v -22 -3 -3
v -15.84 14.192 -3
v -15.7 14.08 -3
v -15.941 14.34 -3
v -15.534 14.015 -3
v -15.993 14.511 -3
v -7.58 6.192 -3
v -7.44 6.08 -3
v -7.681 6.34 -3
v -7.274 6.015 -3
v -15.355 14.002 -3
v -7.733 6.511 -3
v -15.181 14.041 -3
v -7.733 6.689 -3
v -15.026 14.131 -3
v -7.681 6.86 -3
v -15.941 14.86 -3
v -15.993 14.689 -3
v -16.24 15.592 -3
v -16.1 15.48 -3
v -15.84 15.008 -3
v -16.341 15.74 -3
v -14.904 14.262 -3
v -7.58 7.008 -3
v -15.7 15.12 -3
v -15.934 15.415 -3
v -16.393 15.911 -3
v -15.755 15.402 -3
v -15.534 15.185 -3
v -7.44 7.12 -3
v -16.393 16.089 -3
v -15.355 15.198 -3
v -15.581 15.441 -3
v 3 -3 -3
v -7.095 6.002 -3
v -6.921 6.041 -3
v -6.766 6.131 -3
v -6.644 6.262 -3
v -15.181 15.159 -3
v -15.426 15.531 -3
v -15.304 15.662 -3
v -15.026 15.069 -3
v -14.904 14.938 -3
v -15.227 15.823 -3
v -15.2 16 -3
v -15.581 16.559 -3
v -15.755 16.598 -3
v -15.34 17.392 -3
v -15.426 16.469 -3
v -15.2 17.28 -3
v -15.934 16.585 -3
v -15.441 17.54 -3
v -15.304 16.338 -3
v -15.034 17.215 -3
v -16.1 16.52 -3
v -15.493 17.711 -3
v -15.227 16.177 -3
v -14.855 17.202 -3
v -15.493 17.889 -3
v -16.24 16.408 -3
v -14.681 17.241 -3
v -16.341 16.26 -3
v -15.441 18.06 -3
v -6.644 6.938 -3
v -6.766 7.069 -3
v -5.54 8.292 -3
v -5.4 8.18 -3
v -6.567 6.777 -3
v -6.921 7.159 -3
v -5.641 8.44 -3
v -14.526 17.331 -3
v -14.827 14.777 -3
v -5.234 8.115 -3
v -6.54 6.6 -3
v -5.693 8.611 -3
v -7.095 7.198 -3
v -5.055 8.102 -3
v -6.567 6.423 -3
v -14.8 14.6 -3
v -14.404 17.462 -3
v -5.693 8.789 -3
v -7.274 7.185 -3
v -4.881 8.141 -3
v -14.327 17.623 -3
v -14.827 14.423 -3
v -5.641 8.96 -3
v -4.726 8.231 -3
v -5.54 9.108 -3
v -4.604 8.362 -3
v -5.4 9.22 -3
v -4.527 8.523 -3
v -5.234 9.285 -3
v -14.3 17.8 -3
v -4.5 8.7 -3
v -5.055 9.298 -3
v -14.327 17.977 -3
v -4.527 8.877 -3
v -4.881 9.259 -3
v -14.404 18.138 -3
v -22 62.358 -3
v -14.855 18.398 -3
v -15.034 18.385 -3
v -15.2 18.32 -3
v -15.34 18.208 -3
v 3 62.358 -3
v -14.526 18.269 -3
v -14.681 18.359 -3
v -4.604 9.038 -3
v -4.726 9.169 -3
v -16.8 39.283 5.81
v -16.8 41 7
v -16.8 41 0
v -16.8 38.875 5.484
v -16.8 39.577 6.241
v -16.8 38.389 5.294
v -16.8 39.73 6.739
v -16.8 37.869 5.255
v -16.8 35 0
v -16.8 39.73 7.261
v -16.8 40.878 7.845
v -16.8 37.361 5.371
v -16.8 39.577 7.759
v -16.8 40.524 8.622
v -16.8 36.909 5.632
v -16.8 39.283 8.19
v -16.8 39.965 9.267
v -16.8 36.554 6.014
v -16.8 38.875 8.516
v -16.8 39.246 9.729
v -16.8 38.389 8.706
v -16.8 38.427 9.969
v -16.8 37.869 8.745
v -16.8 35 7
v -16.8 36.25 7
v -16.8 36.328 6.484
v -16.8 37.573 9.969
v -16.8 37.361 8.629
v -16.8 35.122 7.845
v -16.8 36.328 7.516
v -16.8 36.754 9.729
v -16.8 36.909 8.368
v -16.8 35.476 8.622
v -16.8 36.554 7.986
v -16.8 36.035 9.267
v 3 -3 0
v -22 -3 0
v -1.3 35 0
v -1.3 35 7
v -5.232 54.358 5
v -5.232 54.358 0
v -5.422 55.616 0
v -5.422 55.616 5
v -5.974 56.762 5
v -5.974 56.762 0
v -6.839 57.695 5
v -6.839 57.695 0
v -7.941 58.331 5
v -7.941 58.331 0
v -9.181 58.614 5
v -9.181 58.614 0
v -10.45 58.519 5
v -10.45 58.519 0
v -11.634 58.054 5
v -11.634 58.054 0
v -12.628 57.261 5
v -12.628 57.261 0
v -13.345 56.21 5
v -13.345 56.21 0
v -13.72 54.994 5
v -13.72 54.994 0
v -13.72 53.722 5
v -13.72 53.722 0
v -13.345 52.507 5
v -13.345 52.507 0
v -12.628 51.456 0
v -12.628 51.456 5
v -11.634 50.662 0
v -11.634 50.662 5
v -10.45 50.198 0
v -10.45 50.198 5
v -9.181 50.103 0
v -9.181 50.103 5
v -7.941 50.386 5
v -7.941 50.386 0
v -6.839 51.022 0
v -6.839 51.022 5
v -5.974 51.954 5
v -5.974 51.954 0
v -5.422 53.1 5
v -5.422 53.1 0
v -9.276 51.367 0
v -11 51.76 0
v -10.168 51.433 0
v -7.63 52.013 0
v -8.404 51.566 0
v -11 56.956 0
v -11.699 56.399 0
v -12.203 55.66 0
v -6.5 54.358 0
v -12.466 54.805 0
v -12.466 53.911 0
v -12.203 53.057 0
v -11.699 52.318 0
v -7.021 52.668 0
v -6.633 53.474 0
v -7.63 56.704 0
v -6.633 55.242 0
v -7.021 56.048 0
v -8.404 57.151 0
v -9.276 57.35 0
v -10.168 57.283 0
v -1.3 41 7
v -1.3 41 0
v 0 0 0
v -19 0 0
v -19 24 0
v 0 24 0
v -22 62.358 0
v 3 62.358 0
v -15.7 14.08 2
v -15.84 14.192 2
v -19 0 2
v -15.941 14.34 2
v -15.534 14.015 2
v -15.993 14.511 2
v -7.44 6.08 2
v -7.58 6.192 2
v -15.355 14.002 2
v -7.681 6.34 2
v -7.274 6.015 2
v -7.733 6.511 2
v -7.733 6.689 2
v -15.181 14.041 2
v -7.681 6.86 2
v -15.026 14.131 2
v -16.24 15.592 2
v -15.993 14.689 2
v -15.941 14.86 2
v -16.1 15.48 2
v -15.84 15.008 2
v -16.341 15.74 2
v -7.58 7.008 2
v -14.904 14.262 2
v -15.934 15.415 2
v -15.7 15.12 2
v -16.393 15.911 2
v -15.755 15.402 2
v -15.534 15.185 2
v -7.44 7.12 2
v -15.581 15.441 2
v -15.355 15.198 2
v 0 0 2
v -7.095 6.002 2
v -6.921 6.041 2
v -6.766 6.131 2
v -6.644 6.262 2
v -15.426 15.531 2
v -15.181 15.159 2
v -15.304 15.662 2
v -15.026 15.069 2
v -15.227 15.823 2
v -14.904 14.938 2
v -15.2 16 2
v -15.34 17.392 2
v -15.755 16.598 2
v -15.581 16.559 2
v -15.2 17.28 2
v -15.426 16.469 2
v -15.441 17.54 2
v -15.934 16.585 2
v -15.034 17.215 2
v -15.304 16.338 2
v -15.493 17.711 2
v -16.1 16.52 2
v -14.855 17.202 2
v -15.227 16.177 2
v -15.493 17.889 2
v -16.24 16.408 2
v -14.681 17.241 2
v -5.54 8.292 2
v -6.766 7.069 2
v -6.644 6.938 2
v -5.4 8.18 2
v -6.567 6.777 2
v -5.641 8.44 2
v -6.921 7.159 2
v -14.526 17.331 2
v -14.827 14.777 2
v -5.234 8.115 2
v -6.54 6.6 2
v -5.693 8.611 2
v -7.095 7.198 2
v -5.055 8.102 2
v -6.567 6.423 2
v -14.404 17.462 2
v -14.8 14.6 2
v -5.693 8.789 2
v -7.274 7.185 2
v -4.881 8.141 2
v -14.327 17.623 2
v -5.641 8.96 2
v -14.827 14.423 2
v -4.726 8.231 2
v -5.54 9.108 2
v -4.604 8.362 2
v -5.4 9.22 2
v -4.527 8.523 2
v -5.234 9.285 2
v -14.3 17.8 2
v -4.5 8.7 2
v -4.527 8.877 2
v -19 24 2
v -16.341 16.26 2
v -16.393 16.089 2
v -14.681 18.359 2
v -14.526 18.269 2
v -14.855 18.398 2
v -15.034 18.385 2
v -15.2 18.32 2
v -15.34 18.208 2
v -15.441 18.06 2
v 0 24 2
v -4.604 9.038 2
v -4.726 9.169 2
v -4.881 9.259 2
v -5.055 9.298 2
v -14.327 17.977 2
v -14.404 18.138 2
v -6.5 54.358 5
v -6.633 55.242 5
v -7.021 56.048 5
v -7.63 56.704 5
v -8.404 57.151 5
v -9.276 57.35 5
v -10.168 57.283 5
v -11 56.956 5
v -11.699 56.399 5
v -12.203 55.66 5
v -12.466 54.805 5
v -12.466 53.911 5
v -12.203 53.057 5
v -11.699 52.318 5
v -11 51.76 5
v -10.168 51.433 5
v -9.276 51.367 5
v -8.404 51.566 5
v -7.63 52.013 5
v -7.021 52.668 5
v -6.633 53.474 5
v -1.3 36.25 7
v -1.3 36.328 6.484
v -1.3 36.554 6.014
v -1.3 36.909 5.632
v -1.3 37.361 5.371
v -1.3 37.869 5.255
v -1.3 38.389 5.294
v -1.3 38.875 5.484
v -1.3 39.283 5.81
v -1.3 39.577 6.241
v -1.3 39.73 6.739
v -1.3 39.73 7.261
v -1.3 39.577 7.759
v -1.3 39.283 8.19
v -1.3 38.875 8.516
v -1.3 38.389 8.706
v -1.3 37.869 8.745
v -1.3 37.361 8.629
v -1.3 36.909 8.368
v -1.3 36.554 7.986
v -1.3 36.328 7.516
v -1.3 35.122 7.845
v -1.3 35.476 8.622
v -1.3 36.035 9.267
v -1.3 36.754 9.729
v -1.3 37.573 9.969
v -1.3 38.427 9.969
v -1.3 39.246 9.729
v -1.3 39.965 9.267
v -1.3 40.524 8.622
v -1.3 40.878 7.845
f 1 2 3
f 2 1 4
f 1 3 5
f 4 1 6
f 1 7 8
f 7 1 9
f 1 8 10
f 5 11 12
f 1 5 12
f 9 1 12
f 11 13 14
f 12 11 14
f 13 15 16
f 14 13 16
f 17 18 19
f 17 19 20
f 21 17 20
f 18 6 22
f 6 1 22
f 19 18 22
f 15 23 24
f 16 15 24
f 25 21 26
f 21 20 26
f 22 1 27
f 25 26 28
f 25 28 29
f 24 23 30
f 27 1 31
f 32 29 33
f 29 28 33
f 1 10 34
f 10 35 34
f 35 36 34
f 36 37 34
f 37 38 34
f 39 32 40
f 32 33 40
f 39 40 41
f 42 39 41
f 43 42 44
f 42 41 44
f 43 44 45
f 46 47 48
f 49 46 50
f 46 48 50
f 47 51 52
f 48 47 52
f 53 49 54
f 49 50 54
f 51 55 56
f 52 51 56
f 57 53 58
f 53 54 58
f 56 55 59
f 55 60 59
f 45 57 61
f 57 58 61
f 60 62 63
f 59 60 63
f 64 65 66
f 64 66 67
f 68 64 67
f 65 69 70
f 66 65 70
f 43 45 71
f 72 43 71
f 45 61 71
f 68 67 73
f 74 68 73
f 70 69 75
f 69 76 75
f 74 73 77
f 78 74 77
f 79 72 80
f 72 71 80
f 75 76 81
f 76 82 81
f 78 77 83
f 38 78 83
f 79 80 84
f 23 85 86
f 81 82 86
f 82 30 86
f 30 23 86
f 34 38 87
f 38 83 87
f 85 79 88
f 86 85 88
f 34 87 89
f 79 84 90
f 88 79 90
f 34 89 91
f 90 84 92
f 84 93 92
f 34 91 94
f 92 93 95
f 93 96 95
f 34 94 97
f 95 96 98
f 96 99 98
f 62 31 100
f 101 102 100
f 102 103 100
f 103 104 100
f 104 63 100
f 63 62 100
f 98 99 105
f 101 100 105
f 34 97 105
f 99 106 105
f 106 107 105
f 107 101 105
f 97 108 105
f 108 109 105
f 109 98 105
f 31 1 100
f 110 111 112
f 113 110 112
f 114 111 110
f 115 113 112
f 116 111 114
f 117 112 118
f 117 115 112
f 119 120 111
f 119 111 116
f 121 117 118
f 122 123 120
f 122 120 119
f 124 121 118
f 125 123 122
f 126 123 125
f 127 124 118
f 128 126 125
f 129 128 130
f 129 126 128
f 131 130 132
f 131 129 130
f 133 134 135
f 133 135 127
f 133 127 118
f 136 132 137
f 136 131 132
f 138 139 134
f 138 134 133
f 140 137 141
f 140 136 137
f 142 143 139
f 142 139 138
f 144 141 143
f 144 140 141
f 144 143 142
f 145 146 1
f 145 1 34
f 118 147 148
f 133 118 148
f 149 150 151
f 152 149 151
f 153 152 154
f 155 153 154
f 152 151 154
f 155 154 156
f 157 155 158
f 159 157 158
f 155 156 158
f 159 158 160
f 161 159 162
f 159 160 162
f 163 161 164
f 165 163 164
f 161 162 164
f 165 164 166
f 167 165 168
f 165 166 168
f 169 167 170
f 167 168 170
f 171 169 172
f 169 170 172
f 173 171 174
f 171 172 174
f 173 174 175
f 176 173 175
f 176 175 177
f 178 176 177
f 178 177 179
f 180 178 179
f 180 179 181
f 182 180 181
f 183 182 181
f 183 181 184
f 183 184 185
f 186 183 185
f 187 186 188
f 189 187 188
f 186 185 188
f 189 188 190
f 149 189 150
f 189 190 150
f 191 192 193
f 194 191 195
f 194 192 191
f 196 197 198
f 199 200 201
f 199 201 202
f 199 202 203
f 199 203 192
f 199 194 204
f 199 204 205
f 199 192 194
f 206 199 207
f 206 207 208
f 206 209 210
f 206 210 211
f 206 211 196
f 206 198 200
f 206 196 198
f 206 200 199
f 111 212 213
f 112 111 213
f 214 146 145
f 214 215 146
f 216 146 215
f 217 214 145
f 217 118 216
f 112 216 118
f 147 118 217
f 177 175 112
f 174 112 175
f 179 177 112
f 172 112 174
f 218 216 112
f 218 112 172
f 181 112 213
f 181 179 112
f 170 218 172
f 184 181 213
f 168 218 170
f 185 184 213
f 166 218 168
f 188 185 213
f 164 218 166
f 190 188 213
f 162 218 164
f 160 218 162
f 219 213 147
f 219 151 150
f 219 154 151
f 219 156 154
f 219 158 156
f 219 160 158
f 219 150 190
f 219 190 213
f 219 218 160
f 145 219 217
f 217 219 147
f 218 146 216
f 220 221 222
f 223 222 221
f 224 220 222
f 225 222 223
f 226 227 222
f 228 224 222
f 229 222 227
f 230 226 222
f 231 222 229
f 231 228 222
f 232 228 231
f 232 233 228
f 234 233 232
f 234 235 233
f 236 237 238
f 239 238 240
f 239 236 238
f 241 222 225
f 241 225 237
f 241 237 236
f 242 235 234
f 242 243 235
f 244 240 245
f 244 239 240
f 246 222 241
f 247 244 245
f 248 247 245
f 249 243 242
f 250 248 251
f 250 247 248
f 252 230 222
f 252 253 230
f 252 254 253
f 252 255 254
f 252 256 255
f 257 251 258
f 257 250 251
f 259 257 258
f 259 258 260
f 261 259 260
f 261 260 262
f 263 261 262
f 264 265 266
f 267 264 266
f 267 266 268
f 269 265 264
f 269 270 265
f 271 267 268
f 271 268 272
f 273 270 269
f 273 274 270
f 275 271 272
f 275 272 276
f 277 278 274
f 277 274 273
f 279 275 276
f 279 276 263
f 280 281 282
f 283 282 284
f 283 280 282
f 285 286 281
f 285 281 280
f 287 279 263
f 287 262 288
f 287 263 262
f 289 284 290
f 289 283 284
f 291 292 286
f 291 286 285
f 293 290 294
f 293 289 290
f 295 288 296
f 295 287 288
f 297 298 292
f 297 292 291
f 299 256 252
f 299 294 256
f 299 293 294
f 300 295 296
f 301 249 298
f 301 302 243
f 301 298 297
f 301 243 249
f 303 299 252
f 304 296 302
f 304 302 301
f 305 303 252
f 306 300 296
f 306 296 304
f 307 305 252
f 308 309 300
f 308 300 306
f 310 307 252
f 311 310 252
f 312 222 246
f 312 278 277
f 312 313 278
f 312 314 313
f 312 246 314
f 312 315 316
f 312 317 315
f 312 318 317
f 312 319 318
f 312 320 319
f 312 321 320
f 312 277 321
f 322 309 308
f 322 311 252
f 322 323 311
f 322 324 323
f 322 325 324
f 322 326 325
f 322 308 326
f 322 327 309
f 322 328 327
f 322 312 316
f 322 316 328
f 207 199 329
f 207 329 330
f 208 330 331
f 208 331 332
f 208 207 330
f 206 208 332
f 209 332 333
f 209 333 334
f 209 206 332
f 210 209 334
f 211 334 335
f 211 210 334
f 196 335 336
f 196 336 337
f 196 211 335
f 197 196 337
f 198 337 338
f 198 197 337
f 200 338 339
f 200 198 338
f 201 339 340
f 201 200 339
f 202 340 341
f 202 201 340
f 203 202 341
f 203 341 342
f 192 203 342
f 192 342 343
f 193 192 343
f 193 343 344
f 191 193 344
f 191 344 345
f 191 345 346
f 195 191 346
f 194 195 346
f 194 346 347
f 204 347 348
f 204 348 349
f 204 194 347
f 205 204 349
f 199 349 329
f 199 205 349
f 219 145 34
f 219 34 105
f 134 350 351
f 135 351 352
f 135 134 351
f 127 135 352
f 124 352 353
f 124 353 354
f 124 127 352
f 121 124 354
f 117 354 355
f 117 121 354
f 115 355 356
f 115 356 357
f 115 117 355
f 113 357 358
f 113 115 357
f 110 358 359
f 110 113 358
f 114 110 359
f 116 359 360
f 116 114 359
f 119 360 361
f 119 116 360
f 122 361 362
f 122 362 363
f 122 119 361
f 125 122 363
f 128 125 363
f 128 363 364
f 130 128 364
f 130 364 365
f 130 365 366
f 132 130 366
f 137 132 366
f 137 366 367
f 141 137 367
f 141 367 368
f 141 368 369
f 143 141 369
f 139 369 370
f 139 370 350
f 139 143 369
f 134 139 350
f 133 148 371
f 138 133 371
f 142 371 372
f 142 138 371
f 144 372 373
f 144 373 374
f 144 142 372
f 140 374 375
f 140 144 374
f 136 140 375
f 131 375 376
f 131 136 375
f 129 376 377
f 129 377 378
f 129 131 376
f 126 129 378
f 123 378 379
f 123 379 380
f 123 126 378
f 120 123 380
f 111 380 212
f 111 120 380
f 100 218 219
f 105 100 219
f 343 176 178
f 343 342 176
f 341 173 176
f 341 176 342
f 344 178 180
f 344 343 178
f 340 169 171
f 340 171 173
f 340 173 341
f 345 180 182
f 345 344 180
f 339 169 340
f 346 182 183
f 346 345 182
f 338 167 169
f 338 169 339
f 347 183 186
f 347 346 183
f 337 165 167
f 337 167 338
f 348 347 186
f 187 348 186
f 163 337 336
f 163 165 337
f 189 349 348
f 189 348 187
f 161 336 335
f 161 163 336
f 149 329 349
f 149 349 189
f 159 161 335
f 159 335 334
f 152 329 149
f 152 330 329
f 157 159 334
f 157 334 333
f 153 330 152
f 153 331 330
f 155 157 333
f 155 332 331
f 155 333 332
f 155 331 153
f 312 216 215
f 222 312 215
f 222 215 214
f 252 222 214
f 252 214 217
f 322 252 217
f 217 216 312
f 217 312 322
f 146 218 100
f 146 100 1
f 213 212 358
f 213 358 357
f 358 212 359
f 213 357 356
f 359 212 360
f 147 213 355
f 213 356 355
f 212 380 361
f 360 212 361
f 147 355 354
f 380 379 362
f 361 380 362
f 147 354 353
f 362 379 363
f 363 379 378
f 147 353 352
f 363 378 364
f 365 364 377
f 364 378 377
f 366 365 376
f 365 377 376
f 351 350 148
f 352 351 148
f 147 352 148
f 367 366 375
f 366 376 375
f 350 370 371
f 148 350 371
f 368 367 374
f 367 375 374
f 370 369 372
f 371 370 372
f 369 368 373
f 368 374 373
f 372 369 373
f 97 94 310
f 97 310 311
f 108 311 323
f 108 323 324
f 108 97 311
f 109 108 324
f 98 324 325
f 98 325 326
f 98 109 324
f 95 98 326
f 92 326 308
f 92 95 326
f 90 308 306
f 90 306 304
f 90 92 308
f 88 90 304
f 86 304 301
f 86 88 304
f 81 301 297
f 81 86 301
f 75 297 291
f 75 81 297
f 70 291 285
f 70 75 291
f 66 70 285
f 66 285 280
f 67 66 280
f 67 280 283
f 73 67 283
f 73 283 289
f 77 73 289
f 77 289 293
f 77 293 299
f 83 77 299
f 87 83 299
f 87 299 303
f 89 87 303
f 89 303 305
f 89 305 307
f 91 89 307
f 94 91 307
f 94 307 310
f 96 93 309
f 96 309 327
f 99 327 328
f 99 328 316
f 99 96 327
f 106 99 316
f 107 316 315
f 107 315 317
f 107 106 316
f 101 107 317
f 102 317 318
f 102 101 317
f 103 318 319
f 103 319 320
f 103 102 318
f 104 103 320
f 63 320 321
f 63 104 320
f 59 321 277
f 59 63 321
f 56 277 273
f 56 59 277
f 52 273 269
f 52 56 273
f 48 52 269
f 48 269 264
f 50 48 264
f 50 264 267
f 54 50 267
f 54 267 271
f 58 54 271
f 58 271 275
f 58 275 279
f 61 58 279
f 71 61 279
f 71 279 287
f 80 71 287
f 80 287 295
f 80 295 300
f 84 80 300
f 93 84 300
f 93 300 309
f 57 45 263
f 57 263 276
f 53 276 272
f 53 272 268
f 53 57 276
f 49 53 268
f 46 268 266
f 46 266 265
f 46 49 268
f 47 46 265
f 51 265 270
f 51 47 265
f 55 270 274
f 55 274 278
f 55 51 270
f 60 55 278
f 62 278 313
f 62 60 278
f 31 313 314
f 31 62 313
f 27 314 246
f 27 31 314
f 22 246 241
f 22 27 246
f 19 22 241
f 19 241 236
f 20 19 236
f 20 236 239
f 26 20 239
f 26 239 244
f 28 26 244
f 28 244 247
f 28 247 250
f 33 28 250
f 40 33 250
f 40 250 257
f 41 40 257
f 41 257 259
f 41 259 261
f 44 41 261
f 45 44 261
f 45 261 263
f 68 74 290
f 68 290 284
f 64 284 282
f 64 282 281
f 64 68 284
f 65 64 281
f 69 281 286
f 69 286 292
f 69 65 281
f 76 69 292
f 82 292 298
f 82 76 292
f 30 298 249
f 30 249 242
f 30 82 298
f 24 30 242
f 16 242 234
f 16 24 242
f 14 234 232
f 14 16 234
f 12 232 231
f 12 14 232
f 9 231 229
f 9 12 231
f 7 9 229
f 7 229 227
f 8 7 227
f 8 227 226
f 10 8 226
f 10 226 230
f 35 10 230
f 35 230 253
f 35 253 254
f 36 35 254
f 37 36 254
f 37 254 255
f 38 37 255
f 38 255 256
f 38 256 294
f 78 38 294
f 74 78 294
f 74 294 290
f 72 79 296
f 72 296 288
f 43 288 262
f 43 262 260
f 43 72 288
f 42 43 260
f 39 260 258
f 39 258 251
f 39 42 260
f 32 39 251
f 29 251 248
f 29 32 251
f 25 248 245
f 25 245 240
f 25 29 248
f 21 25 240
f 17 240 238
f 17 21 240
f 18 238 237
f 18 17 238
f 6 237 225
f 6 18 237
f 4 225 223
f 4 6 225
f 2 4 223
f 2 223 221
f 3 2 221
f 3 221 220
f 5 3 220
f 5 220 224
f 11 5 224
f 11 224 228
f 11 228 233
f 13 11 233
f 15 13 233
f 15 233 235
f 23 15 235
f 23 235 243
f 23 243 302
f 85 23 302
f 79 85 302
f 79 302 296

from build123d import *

# Parameters (mm, degrees)
F0_W      = 5.4119601846
F0_H      = 3
F0_W_2    = 25
F0_H_2    = 35.3582080007
F0_R      = 4.2675896262
F0_W_3    = 4.1414871812
F0_W_4    = 3.0508699417
F0_W_5    = 6.3956826925
F0_W_6    = 19
F0_H_3    = 13.8665742949
F0_R_2    = 0.6
F1_DEPTH  = 3
F2_DEPTH  = 2
F0_R_3    = 3
F3_DEPTH  = 5
F4_DEPTH  = 3
F8_DEPTH  = 15.5
F9_W      = 25
F9_H      = 65.3582080007
F9_R      = 1.5
F9_R_2    = 0.6
F10_DEPTH = 3


with BuildPart() as f1:
    # F0 (on Top) → F1 (new body)
    with BuildSketch(Plane.XY):
        with Locations((-13.243149966, -1.5)):
            Rectangle(F0_W, F0_H)
        with Locations((-9.5, 44.6791040003)):
            Rectangle(F0_W_2, F0_H_2)
        with Locations((-9.5, 54.3582080007)):
            Circle(F0_R, mode=Mode.SUBTRACT)
        with Locations((-2.0707435906, -1.5)):
            Rectangle(F0_W_3, F0_H)
        with Locations((-17.4745650291, -1.5)):
            Rectangle(F0_W_4, F0_H)
        with Locations((-7.3393285275, -1.5)):
            Rectangle(F0_W_5, F0_H)
        Polygon((0, 10.1334257051), (0, 0), (0, -3), (3, -3), (3, 27), (-22, 27), (-22, -3), (-19, -3), (-19, 0), (-19, 10.1334257051), (-19, 24), (0, 24), align=None)
        with Locations((-9.5, 17.0667128526)):
            Rectangle(F0_W_6, F0_H_3)
        with Locations((-15.8, 16)):
            Circle(F0_R_2, mode=Mode.SUBTRACT)
        with Locations((-15.4, 14.6)):
            Circle(F0_R_2, mode=Mode.SUBTRACT)
        with Locations((-14.9, 17.8)):
            Circle(F0_R_2, mode=Mode.SUBTRACT)
        Polygon((-4.1414871812, 0), (0, 0), (0, 10.1334257051), (-19, 10.1334257051), (-19, 0), (-15.9491300583, 0), (-10.5371698737, 0), align=None)
        with Locations((-7.14, 6.6)):
            Circle(F0_R_2, mode=Mode.SUBTRACT)
        with Locations((-5.1, 8.7)):
            Circle(F0_R_2, mode=Mode.SUBTRACT)
    extrude(amount=-F1_DEPTH)

    # F0 (on Top) → F2 (join)
    with BuildSketch(Plane.XY):
        with Locations((-9.5, 17.0667128526)):
            Rectangle(F0_W_6, F0_H_3)
        with Locations((-15.8, 16)):
            Circle(F0_R_2, mode=Mode.SUBTRACT)
        with Locations((-15.4, 14.6)):
            Circle(F0_R_2, mode=Mode.SUBTRACT)
        with Locations((-14.9, 17.8)):
            Circle(F0_R_2, mode=Mode.SUBTRACT)
        Polygon((-4.1414871812, 0), (0, 0), (0, 10.1334257051), (-19, 10.1334257051), (-19, 0), (-15.9491300583, 0), (-10.5371698737, 0), align=None)
        with Locations((-7.14, 6.6)):
            Circle(F0_R_2, mode=Mode.SUBTRACT)
        with Locations((-5.1, 8.7)):
            Circle(F0_R_2, mode=Mode.SUBTRACT)
    extrude(amount=F2_DEPTH)

    # F0 (on Top) → F3 (join)
    with BuildSketch(Plane.XY):
        with Locations((-9.5, 54.3582080007)):
            Circle(F0_R)
        with Locations((-9.5, 54.3582080007)):
            Circle(F0_R_3, mode=Mode.SUBTRACT)
    extrude(amount=F3_DEPTH)

    # F0 (on Top) → F4 (join)
    with BuildSketch(Plane.XY):
        with Locations((-9.5, 54.3582080007)):
            Circle(F0_R)
        with Locations((-9.5, 54.3582080007)):
            Circle(F0_R_3, mode=Mode.SUBTRACT)
        with Locations((-9.5, 54.3582080007)):
            Circle(F0_R_3)
    extrude(amount=-F4_DEPTH)

    # F7 (on offset) → F8 (join)
    with BuildSketch(Plane(origin=(-16.8, 0, 0), x_dir=(0, -1, 0), z_dir=(-1, 0, 0))):
        with BuildLine():
            ThreePointArc((-35, 7), (-38, 10), (-41, 7))
            Line((-41, 7), (-39.75, 7))
            ThreePointArc((-39.75, 7), (-38, 8.75), (-36.25, 7))
            Line((-36.25, 7), (-35, 7))
        make_face()
        with BuildLine():
            Line((-41, 7), (-41, 0))
            Line((-41, 0), (-35, 0))
            Line((-35, 0), (-35, 7))
            Line((-35, 7), (-36.25, 7))
            ThreePointArc((-36.25, 7), (-38, 5.25), (-39.75, 7))
            Line((-39.75, 7), (-41, 7))
        make_face()
    extrude(amount=-F8_DEPTH)

    # F9 (on face) → F10 (join)
    with BuildSketch(Plane(origin=(0, 0, -3), x_dir=(1, 0, 0), z_dir=(0, 0, -1))):
        with Locations((-9.5, -29.6791040003)):
            Rectangle(F9_W, F9_H)
        with Locations((-9.5, -54.3582080007)):
            Circle(F9_R, mode=Mode.SUBTRACT)
        with Locations((-15.8, -16)):
            Circle(F9_R_2, mode=Mode.SUBTRACT)
        with Locations((-14.9, -17.8)):
            Circle(F9_R_2, mode=Mode.SUBTRACT)
        with Locations((-15.4, -14.6)):
            Circle(F9_R_2, mode=Mode.SUBTRACT)
        with Locations((-7.14, -6.6)):
            Circle(F9_R_2, mode=Mode.SUBTRACT)
        with Locations((-5.1, -8.7)):
            Circle(F9_R_2, mode=Mode.SUBTRACT)
    extrude(amount=-F10_DEPTH)


solid = f1.part
